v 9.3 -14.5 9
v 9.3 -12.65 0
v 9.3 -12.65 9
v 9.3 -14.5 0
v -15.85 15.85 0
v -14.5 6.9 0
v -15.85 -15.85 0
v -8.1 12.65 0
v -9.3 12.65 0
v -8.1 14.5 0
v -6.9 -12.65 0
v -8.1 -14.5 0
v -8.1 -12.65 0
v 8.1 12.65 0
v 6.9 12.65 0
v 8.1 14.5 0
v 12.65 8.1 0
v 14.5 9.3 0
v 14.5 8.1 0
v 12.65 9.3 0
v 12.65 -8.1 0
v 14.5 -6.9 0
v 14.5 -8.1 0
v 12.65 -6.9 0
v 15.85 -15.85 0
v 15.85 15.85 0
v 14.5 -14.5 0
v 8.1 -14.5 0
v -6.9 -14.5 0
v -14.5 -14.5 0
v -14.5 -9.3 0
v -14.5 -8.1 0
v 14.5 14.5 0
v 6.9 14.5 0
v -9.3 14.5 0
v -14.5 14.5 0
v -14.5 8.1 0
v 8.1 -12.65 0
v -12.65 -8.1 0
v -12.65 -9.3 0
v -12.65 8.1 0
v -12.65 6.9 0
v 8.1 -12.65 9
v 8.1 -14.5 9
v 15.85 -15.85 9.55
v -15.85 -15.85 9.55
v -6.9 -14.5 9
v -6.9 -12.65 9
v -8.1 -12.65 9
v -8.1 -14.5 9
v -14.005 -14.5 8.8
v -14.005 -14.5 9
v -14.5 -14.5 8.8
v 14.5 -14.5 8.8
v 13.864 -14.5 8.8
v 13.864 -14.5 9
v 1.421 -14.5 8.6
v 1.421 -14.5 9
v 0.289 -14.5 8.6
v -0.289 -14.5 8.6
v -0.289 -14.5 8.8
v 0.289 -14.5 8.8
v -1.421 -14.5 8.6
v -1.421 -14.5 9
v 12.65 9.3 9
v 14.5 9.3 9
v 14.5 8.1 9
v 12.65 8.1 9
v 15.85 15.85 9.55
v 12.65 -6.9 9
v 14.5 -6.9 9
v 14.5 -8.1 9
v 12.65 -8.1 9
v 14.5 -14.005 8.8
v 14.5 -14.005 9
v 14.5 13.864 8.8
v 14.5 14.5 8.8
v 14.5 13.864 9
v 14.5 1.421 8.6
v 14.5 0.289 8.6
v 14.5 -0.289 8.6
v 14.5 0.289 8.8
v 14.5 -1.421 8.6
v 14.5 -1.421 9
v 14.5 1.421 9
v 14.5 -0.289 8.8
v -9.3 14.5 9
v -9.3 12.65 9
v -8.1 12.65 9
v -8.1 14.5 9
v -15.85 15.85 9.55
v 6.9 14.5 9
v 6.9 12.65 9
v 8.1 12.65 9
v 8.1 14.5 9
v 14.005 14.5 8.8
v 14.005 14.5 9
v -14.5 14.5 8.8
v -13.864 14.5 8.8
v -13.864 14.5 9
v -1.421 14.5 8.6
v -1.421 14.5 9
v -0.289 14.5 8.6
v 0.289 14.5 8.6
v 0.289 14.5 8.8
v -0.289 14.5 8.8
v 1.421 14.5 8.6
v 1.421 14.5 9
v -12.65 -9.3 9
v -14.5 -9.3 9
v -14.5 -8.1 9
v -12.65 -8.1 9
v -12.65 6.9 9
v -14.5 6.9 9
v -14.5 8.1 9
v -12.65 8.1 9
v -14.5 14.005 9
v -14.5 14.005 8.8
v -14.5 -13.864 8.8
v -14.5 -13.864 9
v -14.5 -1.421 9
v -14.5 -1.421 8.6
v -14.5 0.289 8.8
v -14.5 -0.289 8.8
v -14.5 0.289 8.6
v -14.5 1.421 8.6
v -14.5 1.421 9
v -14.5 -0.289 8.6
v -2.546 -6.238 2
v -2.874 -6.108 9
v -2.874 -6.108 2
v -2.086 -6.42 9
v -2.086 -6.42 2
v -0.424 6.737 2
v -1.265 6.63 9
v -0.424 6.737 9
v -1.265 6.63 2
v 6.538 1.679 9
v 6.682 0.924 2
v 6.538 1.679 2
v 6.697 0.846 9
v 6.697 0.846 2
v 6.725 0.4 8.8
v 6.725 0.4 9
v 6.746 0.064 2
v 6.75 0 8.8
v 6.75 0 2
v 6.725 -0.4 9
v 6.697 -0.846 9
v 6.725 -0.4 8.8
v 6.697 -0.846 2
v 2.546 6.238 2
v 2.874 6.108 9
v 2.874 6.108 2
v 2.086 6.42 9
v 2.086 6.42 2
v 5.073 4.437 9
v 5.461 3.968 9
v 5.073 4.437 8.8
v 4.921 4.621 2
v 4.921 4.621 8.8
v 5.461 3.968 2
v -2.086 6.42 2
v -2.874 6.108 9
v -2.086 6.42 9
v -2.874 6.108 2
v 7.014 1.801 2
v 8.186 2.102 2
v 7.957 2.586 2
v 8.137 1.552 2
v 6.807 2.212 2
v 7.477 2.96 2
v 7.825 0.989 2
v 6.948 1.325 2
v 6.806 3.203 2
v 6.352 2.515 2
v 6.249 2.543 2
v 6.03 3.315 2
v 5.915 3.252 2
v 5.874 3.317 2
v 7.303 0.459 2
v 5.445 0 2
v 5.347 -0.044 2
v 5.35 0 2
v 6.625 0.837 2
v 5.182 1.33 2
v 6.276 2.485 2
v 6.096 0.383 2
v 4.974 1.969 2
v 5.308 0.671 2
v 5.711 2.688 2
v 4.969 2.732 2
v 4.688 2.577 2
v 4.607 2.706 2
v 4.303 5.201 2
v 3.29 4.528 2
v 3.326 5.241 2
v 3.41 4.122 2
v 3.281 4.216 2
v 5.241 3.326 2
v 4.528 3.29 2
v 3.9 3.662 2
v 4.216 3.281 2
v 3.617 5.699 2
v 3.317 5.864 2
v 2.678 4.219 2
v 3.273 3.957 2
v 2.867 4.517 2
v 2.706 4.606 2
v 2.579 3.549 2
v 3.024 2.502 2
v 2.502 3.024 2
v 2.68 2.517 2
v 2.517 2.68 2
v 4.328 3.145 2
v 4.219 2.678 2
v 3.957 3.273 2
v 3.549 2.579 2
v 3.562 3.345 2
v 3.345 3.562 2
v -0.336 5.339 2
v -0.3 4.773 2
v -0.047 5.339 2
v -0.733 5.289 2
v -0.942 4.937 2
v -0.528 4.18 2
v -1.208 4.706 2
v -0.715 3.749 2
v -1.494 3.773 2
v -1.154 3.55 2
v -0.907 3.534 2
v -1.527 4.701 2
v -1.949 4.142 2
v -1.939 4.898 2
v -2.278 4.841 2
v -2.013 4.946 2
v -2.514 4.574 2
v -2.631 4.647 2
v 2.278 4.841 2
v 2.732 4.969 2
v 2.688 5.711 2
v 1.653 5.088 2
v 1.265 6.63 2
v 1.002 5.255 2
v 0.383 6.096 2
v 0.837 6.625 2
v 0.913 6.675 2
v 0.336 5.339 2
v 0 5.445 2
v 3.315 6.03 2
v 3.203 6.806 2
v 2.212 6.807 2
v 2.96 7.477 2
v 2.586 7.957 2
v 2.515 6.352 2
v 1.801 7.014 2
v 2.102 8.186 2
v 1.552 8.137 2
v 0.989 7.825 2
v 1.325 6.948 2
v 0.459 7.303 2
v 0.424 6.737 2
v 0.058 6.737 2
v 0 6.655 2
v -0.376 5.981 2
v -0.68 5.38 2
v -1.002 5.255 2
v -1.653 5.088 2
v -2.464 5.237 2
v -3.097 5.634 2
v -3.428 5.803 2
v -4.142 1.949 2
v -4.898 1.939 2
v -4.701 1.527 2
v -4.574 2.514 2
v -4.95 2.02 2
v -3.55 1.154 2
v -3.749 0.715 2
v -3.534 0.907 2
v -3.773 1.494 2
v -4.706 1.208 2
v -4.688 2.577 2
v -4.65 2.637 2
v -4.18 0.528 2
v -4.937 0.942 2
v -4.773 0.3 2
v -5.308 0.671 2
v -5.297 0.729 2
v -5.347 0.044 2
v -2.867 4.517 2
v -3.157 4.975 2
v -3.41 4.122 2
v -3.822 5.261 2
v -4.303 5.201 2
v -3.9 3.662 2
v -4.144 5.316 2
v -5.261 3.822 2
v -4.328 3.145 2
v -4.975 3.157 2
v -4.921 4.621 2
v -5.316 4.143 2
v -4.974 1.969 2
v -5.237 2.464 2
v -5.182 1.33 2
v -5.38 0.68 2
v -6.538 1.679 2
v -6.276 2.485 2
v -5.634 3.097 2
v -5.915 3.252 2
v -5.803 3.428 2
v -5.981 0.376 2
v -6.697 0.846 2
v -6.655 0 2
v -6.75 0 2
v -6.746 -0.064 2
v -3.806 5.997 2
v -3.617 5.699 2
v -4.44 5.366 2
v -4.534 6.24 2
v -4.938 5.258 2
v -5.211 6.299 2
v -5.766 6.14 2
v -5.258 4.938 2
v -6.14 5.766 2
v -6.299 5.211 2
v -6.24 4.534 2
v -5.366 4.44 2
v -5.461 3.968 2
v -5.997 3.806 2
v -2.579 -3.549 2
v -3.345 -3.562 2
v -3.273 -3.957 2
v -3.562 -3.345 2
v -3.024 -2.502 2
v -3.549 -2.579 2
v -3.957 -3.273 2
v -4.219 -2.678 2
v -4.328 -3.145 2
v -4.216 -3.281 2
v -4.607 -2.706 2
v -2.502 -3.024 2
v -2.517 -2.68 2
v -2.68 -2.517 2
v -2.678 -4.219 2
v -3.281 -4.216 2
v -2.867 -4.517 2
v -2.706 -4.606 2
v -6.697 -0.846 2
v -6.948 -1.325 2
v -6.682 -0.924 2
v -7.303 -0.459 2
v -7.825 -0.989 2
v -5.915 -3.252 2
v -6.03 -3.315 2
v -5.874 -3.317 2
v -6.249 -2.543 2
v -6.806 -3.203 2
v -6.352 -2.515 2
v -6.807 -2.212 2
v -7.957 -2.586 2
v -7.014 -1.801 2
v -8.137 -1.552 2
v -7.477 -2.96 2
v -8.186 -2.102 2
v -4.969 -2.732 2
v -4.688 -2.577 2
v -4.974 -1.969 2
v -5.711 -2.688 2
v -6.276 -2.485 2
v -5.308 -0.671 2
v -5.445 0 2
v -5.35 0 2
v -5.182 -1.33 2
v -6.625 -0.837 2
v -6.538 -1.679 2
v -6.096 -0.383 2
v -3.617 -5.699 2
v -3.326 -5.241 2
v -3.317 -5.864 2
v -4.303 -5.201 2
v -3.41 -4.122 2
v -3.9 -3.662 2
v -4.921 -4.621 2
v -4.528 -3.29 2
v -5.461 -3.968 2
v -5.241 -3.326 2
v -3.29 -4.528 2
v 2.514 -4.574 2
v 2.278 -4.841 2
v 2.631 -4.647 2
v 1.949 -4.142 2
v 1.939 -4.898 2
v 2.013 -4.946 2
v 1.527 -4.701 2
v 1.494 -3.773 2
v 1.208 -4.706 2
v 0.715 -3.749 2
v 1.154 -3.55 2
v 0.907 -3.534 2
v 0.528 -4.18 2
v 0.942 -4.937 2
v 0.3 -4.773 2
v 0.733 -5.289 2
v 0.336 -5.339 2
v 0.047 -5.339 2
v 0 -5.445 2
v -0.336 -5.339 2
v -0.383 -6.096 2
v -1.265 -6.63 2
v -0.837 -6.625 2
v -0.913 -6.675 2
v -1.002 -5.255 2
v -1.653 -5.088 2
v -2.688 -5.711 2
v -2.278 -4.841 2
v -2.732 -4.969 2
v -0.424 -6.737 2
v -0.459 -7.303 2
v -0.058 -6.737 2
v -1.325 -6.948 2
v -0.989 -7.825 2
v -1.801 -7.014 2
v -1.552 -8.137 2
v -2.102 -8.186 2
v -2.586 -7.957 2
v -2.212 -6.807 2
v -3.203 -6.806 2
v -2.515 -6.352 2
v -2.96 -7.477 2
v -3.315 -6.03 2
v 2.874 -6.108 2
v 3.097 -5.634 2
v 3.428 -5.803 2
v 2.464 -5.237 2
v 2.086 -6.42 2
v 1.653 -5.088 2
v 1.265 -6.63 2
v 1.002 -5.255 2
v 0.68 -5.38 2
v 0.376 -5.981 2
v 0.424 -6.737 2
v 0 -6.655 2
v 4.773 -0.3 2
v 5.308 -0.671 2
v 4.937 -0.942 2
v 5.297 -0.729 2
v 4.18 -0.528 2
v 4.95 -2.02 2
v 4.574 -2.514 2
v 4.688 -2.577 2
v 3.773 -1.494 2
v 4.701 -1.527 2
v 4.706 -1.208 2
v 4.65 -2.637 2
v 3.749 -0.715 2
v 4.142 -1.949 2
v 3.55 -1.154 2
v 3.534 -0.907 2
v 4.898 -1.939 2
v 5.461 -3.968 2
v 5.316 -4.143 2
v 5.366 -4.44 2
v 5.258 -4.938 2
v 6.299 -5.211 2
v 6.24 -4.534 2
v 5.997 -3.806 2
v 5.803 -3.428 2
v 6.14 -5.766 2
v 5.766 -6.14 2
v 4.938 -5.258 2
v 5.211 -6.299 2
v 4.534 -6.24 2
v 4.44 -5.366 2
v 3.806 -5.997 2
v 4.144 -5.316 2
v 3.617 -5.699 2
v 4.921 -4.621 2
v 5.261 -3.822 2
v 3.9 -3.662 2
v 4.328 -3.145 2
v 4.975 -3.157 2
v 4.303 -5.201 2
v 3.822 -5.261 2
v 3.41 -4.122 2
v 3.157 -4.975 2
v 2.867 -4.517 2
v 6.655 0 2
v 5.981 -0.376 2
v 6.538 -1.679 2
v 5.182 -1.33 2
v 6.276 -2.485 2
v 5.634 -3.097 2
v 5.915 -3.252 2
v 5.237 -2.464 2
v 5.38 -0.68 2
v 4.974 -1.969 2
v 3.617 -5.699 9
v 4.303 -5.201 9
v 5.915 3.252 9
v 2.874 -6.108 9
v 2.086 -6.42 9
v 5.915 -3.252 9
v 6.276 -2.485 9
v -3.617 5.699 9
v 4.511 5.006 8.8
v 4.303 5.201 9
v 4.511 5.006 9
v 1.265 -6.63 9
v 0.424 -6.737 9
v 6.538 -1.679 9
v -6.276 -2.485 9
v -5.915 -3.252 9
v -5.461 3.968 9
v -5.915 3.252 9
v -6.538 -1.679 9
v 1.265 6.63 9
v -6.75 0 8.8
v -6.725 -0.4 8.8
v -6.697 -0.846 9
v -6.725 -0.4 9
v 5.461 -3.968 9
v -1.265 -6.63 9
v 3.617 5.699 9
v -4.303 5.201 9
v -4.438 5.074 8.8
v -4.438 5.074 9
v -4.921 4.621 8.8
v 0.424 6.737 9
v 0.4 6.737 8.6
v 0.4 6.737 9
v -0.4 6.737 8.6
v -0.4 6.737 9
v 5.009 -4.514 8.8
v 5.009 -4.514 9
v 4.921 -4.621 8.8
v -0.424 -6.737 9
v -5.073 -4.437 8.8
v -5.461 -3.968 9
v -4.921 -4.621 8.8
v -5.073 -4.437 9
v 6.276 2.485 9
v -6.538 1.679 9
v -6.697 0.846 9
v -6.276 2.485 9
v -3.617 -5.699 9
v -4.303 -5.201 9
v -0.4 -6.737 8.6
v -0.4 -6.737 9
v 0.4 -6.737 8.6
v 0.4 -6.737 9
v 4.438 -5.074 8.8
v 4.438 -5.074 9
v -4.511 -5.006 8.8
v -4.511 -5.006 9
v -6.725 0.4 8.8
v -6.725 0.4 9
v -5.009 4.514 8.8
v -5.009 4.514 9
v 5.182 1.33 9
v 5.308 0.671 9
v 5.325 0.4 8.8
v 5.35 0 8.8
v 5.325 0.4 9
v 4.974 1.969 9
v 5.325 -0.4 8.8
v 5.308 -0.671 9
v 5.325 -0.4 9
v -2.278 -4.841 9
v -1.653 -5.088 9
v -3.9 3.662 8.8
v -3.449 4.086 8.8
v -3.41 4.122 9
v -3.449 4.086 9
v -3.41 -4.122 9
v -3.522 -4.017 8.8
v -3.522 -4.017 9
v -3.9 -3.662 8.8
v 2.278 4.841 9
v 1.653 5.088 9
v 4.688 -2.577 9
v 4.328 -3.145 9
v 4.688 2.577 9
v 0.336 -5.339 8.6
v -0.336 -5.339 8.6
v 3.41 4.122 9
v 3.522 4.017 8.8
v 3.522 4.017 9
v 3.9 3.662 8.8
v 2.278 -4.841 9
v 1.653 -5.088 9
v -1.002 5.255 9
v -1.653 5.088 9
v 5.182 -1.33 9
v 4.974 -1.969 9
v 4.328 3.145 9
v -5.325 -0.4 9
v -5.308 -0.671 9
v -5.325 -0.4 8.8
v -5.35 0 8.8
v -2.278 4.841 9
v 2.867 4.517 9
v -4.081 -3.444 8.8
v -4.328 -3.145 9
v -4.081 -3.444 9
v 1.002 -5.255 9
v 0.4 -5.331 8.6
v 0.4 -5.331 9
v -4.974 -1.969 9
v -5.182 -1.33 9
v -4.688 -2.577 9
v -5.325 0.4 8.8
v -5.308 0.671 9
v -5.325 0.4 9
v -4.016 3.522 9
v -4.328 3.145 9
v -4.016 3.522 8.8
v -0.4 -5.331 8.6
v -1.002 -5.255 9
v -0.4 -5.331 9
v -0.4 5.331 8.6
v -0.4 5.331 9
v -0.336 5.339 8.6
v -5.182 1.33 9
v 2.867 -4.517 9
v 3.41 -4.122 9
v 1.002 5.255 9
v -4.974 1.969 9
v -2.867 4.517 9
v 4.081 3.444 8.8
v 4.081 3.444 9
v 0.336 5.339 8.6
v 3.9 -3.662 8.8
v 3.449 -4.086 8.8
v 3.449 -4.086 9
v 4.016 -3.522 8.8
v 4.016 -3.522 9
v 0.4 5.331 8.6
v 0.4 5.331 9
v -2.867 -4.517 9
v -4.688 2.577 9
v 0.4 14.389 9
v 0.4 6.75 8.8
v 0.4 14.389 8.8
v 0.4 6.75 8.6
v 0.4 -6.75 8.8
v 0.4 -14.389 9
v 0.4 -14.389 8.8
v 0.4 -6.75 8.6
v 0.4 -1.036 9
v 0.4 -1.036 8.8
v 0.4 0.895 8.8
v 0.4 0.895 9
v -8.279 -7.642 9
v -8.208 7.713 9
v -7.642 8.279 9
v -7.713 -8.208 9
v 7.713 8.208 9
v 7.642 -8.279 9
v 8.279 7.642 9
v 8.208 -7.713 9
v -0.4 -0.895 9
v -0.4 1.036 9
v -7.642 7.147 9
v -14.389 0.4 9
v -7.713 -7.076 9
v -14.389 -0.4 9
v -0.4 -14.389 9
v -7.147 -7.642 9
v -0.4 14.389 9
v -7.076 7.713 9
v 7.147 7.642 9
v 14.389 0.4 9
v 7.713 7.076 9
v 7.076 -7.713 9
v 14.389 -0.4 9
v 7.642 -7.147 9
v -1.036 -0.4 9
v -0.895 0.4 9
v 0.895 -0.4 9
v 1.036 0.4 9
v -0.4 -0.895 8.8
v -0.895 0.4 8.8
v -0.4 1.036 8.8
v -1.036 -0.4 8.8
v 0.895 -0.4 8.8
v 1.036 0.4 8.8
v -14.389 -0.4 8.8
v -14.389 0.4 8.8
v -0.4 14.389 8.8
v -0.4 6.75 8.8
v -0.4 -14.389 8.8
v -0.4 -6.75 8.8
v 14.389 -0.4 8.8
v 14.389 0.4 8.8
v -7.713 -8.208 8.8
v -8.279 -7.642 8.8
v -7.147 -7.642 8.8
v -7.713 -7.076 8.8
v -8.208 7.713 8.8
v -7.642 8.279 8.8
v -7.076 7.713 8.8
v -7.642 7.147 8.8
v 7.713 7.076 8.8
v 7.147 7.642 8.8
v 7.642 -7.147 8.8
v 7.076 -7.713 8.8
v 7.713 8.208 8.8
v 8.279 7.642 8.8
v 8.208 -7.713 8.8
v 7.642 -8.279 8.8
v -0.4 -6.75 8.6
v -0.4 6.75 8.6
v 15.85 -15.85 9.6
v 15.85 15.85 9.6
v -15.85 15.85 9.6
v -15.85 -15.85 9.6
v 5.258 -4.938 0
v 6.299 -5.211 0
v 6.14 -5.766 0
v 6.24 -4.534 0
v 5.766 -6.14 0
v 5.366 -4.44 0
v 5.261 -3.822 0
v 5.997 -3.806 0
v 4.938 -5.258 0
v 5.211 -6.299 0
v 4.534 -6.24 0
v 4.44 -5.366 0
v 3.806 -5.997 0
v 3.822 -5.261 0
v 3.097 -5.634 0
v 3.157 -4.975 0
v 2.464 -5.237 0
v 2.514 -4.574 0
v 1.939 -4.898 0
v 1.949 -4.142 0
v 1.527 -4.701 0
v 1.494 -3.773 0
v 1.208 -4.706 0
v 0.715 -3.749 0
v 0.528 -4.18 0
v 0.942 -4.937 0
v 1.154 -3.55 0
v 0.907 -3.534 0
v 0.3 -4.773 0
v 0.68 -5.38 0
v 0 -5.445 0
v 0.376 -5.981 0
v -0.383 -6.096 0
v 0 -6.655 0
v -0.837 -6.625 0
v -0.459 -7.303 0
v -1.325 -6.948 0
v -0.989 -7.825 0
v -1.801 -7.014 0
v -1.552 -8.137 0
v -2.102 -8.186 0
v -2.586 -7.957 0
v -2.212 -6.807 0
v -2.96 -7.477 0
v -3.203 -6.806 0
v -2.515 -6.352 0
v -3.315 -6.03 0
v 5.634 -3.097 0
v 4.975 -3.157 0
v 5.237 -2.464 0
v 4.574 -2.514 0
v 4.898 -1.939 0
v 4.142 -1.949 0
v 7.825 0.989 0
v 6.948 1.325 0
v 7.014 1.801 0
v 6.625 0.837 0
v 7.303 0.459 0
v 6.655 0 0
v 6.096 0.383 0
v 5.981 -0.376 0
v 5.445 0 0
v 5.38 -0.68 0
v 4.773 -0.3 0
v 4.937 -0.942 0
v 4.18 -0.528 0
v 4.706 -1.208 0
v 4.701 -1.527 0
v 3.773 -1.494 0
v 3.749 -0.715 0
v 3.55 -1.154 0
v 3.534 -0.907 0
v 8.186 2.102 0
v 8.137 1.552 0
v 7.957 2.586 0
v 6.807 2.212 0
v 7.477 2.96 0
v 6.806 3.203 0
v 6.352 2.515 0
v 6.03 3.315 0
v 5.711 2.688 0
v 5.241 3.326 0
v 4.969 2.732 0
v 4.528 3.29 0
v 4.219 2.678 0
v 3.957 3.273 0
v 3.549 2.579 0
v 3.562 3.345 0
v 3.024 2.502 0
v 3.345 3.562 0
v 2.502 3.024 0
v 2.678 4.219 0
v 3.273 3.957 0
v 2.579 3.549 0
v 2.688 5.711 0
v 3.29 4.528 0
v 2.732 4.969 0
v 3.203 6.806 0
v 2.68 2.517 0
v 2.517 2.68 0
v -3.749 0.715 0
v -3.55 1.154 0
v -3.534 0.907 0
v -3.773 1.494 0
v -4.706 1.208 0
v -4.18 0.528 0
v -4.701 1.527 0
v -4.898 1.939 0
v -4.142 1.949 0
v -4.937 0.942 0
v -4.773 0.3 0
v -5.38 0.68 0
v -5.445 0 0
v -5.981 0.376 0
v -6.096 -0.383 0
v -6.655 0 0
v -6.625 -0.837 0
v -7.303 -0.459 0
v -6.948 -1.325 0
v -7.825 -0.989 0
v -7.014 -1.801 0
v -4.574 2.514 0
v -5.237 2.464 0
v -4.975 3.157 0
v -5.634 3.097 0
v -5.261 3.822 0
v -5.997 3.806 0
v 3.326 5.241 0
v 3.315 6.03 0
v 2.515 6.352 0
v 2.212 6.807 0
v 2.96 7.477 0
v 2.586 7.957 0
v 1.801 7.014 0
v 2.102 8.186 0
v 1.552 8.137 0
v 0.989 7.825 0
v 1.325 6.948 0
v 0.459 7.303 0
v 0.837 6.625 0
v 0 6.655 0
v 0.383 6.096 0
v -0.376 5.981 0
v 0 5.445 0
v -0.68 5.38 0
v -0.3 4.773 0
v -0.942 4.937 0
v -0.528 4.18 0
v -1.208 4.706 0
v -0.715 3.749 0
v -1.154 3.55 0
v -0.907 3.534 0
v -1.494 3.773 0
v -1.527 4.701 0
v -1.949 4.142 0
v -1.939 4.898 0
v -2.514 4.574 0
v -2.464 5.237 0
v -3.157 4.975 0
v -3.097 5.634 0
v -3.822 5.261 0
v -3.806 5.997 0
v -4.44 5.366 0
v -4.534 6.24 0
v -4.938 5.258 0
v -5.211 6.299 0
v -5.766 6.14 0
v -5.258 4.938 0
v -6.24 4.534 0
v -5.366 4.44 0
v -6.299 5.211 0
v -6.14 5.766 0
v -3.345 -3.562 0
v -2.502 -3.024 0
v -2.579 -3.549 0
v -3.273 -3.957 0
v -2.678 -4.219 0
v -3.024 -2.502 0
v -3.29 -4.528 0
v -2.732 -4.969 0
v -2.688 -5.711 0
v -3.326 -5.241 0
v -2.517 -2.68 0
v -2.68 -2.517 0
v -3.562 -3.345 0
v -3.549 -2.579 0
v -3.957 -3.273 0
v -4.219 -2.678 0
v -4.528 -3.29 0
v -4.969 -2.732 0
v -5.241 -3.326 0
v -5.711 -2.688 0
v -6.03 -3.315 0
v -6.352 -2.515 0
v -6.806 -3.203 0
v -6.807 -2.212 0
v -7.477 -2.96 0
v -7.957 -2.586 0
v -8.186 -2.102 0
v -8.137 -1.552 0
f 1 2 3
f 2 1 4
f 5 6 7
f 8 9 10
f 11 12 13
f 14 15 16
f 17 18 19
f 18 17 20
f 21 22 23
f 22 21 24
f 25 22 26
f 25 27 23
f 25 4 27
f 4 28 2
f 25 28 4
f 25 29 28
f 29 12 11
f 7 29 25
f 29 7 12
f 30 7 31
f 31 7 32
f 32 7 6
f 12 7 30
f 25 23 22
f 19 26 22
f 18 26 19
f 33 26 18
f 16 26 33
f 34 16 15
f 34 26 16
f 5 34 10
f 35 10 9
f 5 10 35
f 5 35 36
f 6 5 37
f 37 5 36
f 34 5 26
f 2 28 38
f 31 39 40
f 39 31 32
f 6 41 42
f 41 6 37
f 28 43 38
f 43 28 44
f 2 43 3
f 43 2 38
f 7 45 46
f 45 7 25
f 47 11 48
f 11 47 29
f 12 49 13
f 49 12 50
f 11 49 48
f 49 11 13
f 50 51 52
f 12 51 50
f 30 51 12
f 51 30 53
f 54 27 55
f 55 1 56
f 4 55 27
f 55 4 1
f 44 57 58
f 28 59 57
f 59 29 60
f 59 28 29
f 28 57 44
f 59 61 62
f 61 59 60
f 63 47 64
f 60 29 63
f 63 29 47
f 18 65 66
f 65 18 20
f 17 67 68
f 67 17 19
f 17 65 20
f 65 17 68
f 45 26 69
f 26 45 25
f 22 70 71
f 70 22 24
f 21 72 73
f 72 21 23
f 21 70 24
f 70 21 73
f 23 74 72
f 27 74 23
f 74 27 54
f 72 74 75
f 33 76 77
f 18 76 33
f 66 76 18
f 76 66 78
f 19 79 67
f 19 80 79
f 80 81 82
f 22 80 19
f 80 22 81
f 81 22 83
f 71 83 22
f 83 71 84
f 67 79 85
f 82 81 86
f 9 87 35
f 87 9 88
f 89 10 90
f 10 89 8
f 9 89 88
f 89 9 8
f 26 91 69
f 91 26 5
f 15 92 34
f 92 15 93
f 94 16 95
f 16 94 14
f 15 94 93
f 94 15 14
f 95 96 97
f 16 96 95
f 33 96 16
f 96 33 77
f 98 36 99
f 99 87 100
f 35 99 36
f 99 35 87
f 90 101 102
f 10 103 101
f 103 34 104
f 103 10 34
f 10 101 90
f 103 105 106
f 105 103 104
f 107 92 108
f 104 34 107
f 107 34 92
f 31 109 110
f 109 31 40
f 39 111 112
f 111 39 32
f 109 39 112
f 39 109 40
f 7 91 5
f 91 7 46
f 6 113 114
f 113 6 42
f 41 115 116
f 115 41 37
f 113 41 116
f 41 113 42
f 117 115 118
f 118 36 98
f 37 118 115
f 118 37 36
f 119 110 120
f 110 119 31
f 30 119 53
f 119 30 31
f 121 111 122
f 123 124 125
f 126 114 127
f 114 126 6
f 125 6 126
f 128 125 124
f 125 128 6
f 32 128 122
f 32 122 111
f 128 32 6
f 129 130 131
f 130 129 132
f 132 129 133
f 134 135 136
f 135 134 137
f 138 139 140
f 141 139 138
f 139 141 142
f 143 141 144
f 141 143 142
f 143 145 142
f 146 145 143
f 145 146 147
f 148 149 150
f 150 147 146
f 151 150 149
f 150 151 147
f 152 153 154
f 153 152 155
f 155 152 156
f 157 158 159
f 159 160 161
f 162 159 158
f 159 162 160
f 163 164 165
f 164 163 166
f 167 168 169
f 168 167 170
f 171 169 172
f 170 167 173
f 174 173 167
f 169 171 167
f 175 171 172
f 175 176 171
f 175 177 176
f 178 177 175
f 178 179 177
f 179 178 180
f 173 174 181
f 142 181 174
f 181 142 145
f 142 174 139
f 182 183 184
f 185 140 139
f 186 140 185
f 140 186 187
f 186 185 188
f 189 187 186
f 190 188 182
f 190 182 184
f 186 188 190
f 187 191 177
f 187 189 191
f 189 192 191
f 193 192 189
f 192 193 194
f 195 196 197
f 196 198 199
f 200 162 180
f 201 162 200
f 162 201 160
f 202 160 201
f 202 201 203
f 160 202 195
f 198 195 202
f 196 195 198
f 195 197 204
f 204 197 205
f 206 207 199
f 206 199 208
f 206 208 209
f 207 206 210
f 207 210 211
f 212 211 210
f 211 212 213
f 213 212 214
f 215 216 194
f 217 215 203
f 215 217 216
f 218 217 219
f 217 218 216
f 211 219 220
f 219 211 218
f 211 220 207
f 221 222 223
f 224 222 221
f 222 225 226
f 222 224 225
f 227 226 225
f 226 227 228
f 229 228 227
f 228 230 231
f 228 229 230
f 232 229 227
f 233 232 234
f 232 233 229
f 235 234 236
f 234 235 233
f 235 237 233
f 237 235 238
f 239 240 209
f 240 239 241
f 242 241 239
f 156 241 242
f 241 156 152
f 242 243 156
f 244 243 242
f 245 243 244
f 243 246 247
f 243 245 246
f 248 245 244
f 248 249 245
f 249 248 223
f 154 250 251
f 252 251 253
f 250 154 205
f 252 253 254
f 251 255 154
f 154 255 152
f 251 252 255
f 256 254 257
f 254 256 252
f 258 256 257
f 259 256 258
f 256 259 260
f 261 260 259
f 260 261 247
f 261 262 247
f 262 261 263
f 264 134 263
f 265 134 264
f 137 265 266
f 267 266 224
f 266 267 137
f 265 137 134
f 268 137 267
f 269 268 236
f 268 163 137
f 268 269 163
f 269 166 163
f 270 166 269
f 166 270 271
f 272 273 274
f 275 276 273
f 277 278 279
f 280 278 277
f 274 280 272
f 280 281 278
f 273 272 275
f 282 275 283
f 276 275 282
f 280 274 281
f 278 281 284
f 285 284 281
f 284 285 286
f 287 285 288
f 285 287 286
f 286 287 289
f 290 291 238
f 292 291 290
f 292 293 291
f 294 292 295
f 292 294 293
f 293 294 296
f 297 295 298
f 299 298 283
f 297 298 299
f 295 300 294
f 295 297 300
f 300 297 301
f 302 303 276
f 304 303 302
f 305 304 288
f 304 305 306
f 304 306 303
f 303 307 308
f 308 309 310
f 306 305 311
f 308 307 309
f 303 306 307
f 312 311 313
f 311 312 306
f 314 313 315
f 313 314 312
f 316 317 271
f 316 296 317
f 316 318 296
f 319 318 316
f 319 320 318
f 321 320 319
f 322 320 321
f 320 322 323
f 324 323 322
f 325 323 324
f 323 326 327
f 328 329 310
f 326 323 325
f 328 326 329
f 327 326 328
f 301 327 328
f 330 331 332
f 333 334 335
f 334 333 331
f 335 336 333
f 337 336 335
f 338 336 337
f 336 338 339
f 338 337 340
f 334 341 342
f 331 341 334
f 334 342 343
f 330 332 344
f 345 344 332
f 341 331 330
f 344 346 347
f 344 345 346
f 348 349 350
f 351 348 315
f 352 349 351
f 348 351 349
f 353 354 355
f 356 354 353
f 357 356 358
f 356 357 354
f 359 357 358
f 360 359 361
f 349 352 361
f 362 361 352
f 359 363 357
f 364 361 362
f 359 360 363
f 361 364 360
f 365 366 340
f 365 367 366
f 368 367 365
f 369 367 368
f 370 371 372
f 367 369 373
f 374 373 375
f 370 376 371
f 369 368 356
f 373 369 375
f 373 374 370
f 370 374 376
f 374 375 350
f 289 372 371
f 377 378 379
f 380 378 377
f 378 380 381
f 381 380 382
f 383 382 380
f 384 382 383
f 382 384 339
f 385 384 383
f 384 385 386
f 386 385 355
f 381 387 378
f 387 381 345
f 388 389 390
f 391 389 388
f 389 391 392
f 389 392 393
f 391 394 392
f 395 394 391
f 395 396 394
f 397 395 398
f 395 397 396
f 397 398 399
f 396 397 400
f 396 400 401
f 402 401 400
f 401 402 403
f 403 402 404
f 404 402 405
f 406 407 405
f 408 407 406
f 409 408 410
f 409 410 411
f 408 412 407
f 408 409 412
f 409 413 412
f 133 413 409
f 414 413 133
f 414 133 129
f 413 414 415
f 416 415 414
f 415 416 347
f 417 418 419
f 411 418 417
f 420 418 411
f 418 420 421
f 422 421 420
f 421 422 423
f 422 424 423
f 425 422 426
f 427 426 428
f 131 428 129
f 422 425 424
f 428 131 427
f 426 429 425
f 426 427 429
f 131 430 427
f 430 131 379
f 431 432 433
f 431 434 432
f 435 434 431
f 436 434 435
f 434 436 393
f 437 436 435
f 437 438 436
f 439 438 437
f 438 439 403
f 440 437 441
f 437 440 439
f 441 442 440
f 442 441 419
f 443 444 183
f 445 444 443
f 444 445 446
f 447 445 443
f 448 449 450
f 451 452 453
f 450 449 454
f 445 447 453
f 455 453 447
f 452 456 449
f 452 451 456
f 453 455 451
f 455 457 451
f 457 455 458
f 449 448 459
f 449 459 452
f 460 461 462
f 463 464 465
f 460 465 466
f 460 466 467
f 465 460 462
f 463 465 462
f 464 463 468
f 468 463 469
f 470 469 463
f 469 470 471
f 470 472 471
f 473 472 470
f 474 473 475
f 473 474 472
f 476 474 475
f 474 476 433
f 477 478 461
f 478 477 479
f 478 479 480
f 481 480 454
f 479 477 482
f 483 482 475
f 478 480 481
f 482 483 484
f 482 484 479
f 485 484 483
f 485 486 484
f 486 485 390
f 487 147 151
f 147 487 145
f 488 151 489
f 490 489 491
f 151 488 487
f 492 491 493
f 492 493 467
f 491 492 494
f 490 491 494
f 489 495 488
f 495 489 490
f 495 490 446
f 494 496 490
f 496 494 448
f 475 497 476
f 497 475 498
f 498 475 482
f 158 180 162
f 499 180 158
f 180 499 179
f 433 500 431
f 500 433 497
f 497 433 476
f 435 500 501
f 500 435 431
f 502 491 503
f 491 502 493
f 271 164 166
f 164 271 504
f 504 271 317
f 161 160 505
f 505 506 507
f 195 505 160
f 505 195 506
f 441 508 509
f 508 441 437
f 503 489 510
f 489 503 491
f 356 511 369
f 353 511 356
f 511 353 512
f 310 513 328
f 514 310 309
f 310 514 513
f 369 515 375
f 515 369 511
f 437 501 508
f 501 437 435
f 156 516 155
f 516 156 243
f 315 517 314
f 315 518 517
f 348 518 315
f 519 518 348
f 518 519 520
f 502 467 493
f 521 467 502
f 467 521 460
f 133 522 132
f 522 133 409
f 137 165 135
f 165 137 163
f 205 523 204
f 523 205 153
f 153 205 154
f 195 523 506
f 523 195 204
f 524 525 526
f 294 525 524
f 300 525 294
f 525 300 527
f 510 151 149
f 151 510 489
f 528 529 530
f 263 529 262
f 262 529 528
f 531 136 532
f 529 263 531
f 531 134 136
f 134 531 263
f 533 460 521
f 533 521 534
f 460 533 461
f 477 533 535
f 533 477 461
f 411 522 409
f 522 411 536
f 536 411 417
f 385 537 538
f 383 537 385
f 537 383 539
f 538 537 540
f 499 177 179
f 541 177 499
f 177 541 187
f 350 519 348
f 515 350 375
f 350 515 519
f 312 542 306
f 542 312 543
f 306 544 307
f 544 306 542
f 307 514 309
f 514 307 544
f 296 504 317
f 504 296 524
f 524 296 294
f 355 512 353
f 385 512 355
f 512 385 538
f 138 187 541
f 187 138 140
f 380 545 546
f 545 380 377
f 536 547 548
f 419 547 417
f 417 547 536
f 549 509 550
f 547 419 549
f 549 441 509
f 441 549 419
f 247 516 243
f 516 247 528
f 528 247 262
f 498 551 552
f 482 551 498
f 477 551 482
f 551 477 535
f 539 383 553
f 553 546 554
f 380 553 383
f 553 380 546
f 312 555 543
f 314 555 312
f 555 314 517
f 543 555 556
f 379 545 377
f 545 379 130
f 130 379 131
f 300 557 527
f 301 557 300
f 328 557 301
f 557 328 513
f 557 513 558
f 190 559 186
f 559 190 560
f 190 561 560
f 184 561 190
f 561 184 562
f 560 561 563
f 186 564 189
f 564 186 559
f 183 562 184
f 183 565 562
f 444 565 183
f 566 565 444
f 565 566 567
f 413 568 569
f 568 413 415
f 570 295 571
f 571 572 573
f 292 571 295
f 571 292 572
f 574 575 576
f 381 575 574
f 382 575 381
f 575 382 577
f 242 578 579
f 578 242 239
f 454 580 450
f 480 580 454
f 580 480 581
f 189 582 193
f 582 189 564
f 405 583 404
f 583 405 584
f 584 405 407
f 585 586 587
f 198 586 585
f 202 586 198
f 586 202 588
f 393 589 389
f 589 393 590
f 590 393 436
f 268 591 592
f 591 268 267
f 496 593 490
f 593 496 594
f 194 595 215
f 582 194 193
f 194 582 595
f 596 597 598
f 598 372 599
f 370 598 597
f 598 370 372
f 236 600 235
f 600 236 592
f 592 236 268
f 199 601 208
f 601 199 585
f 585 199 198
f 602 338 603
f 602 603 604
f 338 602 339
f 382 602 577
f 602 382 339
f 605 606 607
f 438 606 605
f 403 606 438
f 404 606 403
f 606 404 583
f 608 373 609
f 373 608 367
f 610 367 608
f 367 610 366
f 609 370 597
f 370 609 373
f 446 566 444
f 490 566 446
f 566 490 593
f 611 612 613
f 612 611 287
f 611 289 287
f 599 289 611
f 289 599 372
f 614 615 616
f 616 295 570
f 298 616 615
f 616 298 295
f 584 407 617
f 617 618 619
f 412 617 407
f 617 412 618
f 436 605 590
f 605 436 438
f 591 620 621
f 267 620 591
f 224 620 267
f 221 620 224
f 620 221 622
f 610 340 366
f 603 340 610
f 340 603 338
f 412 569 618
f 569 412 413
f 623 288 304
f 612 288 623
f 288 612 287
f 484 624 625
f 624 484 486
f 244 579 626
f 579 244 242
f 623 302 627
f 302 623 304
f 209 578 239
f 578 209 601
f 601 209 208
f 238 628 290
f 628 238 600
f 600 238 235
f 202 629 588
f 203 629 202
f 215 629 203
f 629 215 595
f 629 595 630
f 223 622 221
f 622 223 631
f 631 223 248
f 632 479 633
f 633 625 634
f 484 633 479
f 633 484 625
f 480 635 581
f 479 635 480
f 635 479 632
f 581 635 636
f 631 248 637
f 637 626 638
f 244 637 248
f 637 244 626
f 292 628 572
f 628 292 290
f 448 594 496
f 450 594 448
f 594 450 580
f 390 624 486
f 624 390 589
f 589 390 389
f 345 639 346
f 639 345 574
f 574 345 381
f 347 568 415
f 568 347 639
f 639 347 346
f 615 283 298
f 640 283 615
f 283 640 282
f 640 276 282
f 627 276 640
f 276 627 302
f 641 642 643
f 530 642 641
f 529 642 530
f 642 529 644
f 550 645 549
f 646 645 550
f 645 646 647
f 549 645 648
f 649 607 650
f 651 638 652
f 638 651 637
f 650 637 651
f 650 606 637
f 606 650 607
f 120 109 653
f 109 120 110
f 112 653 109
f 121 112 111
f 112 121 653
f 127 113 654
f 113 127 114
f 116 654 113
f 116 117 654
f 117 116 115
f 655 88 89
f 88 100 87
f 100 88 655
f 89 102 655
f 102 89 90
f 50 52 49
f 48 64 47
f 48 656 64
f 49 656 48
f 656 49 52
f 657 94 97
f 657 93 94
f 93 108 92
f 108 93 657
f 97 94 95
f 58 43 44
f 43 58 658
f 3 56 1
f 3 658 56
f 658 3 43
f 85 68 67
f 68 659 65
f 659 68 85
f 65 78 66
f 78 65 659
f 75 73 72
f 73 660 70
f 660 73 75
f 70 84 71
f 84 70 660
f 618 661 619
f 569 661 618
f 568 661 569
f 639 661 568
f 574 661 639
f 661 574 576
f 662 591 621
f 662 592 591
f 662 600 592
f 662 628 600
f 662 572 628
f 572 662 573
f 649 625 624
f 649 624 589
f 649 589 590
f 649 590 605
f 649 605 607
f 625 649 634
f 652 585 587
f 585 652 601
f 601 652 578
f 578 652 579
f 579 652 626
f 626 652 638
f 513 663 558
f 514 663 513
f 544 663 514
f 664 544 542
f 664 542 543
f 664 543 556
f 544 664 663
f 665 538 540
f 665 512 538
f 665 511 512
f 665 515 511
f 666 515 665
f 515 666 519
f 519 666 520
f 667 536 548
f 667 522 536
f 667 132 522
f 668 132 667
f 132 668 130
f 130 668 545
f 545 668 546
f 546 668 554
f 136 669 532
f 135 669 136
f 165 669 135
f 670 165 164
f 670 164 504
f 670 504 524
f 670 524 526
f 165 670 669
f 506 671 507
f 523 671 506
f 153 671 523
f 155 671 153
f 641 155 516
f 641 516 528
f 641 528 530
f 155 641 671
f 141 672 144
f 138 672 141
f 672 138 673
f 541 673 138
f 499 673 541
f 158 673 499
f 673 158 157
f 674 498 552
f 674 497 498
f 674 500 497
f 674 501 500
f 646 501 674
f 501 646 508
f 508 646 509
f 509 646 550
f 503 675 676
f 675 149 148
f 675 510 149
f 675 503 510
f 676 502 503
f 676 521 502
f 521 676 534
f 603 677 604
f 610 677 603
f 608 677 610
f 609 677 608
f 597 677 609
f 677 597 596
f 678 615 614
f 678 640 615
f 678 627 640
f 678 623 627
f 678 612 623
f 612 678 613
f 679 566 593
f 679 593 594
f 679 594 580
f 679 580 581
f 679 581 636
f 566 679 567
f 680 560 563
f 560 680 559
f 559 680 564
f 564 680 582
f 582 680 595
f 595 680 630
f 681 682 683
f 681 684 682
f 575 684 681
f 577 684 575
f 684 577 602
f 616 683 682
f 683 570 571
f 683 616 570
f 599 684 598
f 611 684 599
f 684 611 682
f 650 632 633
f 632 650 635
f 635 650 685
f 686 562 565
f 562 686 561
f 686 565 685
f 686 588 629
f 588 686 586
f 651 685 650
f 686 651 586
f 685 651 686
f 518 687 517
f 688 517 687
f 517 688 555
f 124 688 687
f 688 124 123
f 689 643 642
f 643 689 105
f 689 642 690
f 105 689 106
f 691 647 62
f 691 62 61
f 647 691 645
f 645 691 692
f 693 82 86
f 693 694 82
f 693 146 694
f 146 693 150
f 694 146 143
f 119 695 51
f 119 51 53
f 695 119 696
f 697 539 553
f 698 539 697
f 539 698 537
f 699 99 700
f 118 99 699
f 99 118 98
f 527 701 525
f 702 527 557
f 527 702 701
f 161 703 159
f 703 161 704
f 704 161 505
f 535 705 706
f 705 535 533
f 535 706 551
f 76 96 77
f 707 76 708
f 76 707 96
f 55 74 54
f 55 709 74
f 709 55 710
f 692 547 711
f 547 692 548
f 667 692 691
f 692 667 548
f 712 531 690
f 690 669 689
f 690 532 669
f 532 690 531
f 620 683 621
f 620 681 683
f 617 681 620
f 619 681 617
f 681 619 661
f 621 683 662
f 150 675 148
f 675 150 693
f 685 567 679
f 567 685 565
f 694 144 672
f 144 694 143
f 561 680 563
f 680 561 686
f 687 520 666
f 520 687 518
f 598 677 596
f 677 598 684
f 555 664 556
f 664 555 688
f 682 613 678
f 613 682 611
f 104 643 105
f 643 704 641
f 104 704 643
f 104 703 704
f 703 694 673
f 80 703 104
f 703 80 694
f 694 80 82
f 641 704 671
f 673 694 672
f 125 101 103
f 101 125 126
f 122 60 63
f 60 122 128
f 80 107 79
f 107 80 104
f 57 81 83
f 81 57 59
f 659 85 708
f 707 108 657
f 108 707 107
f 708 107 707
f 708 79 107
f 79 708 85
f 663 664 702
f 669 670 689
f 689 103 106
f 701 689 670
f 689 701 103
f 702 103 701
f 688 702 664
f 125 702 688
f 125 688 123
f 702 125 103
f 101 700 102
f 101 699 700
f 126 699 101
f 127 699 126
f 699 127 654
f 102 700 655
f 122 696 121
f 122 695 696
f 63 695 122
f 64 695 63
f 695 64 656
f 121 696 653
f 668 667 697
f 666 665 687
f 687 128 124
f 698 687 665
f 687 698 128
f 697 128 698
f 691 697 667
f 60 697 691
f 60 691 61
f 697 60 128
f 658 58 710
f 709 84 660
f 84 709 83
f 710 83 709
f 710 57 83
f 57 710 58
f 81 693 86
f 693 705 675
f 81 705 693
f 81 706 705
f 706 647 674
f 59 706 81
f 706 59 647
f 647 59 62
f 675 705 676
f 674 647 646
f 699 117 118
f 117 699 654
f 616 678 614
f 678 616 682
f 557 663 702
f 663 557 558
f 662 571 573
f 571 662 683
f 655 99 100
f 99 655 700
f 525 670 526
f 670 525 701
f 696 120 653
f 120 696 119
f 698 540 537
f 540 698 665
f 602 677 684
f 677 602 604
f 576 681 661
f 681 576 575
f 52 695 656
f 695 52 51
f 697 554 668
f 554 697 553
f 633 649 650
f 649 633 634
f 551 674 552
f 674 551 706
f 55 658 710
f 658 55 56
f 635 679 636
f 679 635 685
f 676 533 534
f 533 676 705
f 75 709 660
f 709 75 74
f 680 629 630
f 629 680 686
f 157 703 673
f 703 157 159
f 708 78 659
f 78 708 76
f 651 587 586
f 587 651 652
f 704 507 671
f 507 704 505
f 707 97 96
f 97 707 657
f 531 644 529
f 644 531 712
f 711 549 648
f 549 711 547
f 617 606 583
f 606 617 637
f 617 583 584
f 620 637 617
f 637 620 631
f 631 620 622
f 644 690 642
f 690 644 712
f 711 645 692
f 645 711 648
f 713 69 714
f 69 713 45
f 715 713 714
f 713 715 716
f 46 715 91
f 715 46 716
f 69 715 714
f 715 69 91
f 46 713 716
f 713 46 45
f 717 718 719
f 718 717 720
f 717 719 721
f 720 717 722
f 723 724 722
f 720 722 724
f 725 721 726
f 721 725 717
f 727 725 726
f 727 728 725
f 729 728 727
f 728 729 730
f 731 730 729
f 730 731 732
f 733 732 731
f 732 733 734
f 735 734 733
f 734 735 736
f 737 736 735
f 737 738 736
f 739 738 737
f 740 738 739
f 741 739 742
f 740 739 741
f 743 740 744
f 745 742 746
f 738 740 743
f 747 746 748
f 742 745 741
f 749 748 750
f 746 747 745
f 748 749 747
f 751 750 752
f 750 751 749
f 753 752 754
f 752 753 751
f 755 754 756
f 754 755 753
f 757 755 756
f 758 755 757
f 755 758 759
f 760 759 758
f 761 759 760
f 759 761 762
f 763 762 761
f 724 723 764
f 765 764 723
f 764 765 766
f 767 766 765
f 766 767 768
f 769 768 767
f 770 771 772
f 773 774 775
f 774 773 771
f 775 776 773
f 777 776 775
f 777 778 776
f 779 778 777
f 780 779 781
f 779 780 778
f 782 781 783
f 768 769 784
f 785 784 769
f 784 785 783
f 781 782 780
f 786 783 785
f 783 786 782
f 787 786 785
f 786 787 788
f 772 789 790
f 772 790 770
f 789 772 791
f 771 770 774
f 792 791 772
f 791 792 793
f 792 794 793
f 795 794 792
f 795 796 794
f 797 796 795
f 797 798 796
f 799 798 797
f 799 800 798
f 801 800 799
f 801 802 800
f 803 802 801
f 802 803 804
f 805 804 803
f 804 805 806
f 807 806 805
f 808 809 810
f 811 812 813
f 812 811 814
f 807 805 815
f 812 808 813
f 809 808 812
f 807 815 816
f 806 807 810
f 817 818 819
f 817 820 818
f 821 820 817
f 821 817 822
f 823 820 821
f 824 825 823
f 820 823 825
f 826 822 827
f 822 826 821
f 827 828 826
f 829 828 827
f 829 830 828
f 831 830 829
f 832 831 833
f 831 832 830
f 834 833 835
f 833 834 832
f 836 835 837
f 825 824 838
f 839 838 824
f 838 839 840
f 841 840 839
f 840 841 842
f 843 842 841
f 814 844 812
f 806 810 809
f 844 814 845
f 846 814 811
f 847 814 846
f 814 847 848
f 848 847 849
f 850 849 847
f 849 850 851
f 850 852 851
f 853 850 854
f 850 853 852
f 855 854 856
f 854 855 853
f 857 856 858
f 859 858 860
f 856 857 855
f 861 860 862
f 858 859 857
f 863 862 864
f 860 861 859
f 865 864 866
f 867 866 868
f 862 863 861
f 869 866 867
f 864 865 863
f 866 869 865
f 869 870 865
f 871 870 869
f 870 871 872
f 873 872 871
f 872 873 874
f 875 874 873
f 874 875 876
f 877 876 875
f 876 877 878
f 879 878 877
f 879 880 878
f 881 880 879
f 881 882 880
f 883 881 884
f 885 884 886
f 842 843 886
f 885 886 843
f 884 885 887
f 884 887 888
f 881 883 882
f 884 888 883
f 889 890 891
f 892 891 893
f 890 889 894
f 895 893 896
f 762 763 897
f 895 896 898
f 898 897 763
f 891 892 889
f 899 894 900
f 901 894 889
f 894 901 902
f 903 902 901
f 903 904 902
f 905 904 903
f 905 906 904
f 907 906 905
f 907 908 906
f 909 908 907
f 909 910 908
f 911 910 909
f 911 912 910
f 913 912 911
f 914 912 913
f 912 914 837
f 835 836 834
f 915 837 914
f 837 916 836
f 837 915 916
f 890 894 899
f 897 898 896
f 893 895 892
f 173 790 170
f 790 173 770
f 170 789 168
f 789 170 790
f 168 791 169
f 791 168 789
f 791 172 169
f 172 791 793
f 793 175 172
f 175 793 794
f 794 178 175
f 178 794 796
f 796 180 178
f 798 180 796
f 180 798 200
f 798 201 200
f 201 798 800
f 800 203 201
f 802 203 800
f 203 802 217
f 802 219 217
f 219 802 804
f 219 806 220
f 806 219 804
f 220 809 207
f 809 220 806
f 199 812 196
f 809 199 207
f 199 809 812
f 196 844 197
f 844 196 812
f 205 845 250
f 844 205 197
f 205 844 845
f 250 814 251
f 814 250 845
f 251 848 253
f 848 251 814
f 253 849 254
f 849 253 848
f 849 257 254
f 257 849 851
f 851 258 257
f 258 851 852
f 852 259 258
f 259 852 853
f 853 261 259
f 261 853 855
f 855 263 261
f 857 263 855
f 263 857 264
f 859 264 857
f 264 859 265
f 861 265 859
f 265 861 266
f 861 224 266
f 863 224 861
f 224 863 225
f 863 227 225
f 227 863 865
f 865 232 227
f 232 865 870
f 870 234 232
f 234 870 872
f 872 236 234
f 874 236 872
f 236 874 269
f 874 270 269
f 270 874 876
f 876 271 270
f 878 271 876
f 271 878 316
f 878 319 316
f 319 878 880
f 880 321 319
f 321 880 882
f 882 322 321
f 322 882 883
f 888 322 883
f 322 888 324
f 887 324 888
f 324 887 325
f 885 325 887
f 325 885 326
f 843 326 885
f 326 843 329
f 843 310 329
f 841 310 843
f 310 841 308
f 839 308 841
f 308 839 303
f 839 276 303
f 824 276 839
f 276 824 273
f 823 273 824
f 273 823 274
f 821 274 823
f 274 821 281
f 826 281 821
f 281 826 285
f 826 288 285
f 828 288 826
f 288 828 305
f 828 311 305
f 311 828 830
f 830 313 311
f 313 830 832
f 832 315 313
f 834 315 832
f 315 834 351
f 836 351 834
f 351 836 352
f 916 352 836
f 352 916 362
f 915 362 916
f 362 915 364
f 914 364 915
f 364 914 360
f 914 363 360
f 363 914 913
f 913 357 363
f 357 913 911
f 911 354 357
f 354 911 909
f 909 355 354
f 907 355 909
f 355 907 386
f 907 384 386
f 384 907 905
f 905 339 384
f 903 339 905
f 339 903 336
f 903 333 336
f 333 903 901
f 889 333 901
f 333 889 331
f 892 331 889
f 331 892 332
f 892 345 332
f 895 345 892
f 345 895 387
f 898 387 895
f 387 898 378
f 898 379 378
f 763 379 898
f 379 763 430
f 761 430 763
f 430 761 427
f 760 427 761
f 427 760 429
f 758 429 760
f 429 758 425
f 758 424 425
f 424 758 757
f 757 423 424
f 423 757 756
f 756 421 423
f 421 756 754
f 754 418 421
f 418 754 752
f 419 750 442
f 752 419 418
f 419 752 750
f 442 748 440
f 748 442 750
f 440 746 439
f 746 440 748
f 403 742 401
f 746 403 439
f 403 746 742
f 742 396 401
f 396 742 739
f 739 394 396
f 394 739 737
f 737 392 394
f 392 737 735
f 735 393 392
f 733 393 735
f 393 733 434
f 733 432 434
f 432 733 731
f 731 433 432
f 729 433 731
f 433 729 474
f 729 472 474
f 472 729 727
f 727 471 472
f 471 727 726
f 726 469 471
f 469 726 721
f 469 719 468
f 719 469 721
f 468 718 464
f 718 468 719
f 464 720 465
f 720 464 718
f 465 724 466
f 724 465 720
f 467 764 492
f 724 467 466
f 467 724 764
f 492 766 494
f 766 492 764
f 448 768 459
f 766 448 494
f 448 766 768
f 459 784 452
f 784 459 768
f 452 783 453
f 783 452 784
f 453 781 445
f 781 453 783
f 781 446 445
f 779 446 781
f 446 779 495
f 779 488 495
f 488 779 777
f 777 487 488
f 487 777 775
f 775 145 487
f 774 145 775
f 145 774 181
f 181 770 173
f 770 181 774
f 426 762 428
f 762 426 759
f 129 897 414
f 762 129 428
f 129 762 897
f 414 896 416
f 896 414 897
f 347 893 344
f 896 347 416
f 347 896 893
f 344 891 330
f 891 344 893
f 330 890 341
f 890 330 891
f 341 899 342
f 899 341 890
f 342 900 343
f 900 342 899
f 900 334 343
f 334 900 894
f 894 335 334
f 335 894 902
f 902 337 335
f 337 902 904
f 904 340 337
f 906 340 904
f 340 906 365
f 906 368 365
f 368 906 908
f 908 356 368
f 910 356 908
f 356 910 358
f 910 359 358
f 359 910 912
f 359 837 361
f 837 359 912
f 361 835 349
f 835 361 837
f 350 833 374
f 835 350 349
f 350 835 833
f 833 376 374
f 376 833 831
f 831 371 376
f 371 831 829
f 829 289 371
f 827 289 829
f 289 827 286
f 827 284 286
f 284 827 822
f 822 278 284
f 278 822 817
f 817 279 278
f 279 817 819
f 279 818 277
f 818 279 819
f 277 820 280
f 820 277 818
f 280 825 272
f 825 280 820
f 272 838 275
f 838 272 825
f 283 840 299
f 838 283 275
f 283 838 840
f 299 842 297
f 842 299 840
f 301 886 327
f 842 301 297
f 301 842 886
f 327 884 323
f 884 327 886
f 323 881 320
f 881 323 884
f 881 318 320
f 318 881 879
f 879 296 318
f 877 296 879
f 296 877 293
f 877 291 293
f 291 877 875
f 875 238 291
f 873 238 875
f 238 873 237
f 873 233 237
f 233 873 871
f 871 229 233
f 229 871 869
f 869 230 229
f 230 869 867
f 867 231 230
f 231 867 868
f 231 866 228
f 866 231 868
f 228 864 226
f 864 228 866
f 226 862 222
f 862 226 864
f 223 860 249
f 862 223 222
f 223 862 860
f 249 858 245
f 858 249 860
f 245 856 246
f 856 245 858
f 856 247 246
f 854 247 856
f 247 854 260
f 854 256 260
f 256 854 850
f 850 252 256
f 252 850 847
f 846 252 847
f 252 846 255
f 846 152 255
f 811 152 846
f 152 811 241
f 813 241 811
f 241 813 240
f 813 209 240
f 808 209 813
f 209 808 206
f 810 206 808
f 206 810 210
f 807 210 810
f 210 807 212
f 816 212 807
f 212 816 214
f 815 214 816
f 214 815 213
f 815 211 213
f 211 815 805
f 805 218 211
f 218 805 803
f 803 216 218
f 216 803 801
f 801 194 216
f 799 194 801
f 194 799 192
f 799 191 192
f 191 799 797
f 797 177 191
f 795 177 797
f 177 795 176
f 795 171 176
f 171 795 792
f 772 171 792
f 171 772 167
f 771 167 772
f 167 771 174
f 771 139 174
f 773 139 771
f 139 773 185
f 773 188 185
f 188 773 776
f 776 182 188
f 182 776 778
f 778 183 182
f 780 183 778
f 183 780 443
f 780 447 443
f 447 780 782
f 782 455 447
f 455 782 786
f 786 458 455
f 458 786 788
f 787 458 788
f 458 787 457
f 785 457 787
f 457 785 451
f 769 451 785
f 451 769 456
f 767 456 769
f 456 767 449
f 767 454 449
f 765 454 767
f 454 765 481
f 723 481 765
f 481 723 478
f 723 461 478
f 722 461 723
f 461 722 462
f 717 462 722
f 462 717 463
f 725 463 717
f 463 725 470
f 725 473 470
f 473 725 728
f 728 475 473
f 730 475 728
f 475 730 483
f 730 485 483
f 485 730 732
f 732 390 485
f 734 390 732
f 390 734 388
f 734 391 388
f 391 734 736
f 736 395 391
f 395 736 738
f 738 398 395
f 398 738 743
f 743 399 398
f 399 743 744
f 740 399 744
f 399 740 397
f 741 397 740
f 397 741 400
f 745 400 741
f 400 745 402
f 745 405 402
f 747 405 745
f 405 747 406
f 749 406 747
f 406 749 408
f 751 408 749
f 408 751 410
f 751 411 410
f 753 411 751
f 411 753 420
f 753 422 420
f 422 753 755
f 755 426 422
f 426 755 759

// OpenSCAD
$fn = 50;
    // lego dimensions
    // play = 0.15 / 2;
    play = 0.15;
    baseWidth = 32 - 2 * play;
    
    plateHeight = 3 * 3.2 - 0 * play;
    // plateHeight = 1.5 * 3.2 - 0 * play;

    w = baseWidth / 2; // halfWidth
    // t = 1.6; //wall thickness
    t = 1.35; //wall thickness
    //c = t; //ceiling thickness
    c = 0.6; //ceiling thickness
    epsilon = 0.05;

    // sideBlockL = 3.2;
    sideBlockL = 3.2;
    sideBlockT = 1.2;
    // sideBlockRaise = 0.2;
    sideBlockRaise = 0;
    
    innerR = 10.7 / 2;
    // outerR = 13.3 / 2;
    outerR = 13.5 / 2;
    barrelRaise = 2;

    layerHeight = 0.2; //print layer height
    nozzleWidth = 0.4; //print nozzle width


make_ring_of(w, 4)
    wall();

color("green", 0.2)
    translate([-w, -w, -c + plateHeight]) {
        cube([baseWidth, baseWidth, c]);        
    }

color("yellow", 0.5)
translate([0, 0, barrelRaise])
difference() {
    cylinder(r1 = outerR, r2 = outerR, h = plateHeight -barrelRaise - epsilon);
    translate([0, 0, -epsilon])
        cylinder(r1 = innerR, r2 = innerR, h = plateHeight -barrelRaise + epsilon);
        
    // color("orange")
    // cylinder(r1 = outerR + epsilon, r2 = outerR + epsilon, h = layerHeight);
}

module wall() {    
    color("red", 0.2)
    translate([-w, 0, 0])
    cube([baseWidth, t, plateHeight - epsilon]);

    color("blue", 0.2) {
        translate([16.2 / 2, 0, sideBlockRaise])
        cube([sideBlockT, sideBlockL, plateHeight - sideBlockRaise - epsilon]);

        translate([-16.2 / 2, 0, sideBlockRaise])
        cube([sideBlockT, sideBlockL, plateHeight - sideBlockRaise - epsilon]);
    }
}

module make_ring_of(radius, count)
{
    for (a = [0 : count - 1]) {
        angle = a * 360 / count;
        translate(radius * [sin(angle), -cos(angle), 0])
            rotate([0, 0, angle])
                children();
    }
}    


module turnAround(count)
{
    for (a = [0 : count - 1]) {
        angle = a * 360 / count;
            rotate([0, 0, angle])
                children();
    }
} 


// barrel support
function parametric_points(fx, fy, t0=0, t1=10, delta=0.01) 
= [for(i = [t0:delta:t1]) [fx(i), fy(i)]];


r = (innerR + outerR) /2;
a = 1.8;
n = 6;
factor = 0.1;

x1 = function(t) (r * (1 + factor) + a * sin(n * t * 360 )) * cos (t * 360 );
y1 = function(t) (r * (1 + factor) + a * sin(n * t * 360 )) * sin (t * 360 );

x2 = function(t) (r * (1 - factor) + a * sin(n * t * 360 )) * cos (t * 360 );
y2 = function(t) (r * (1 - factor) + a * sin(n * t * 360 )) * sin (t * 360 );

points_1 = parametric_points(fx=x1, fy=y1, t0=0, t1=1);
points_2 = parametric_points(fx=x2, fy=y2,t0=0, t1=1);

color("lime", 0.4)
linear_extrude(barrelRaise)
union() {
    polygon(
        concat(
            points_1,
            points_2
        )
    );
   
}

//ceiling grating

color("brown") {
make_ring_of(w, 4)
    translate([-nozzleWidth, 0, plateHeight - c - layerHeight])
        cube([2 * nozzleWidth, w - epsilon, layerHeight]);

turnAround(4)
translate([w - nozzleWidth * sqrt(2), 0, 0])
rotate([0,0,45])
translate([-nozzleWidth + epsilon, 0,  plateHeight - c - 2 * layerHeight])
    cube([2 * nozzleWidth, w * sqrt(2) - nozzleWidth - 2 * epsilon, 2 * layerHeight]);

translate([-nozzleWidth , -outerR,  plateHeight - c - 2 * layerHeight])
    cube([2 * nozzleWidth, 2 * outerR, 2 * layerHeight]);

turnAround(4)
rotate([0,0,45])
translate([-nozzleWidth + epsilon, 0,  plateHeight - c - layerHeight])
    cube([2 * nozzleWidth, w * sqrt(2) - nozzleWidth - 2 * epsilon, layerHeight]);
 
}
